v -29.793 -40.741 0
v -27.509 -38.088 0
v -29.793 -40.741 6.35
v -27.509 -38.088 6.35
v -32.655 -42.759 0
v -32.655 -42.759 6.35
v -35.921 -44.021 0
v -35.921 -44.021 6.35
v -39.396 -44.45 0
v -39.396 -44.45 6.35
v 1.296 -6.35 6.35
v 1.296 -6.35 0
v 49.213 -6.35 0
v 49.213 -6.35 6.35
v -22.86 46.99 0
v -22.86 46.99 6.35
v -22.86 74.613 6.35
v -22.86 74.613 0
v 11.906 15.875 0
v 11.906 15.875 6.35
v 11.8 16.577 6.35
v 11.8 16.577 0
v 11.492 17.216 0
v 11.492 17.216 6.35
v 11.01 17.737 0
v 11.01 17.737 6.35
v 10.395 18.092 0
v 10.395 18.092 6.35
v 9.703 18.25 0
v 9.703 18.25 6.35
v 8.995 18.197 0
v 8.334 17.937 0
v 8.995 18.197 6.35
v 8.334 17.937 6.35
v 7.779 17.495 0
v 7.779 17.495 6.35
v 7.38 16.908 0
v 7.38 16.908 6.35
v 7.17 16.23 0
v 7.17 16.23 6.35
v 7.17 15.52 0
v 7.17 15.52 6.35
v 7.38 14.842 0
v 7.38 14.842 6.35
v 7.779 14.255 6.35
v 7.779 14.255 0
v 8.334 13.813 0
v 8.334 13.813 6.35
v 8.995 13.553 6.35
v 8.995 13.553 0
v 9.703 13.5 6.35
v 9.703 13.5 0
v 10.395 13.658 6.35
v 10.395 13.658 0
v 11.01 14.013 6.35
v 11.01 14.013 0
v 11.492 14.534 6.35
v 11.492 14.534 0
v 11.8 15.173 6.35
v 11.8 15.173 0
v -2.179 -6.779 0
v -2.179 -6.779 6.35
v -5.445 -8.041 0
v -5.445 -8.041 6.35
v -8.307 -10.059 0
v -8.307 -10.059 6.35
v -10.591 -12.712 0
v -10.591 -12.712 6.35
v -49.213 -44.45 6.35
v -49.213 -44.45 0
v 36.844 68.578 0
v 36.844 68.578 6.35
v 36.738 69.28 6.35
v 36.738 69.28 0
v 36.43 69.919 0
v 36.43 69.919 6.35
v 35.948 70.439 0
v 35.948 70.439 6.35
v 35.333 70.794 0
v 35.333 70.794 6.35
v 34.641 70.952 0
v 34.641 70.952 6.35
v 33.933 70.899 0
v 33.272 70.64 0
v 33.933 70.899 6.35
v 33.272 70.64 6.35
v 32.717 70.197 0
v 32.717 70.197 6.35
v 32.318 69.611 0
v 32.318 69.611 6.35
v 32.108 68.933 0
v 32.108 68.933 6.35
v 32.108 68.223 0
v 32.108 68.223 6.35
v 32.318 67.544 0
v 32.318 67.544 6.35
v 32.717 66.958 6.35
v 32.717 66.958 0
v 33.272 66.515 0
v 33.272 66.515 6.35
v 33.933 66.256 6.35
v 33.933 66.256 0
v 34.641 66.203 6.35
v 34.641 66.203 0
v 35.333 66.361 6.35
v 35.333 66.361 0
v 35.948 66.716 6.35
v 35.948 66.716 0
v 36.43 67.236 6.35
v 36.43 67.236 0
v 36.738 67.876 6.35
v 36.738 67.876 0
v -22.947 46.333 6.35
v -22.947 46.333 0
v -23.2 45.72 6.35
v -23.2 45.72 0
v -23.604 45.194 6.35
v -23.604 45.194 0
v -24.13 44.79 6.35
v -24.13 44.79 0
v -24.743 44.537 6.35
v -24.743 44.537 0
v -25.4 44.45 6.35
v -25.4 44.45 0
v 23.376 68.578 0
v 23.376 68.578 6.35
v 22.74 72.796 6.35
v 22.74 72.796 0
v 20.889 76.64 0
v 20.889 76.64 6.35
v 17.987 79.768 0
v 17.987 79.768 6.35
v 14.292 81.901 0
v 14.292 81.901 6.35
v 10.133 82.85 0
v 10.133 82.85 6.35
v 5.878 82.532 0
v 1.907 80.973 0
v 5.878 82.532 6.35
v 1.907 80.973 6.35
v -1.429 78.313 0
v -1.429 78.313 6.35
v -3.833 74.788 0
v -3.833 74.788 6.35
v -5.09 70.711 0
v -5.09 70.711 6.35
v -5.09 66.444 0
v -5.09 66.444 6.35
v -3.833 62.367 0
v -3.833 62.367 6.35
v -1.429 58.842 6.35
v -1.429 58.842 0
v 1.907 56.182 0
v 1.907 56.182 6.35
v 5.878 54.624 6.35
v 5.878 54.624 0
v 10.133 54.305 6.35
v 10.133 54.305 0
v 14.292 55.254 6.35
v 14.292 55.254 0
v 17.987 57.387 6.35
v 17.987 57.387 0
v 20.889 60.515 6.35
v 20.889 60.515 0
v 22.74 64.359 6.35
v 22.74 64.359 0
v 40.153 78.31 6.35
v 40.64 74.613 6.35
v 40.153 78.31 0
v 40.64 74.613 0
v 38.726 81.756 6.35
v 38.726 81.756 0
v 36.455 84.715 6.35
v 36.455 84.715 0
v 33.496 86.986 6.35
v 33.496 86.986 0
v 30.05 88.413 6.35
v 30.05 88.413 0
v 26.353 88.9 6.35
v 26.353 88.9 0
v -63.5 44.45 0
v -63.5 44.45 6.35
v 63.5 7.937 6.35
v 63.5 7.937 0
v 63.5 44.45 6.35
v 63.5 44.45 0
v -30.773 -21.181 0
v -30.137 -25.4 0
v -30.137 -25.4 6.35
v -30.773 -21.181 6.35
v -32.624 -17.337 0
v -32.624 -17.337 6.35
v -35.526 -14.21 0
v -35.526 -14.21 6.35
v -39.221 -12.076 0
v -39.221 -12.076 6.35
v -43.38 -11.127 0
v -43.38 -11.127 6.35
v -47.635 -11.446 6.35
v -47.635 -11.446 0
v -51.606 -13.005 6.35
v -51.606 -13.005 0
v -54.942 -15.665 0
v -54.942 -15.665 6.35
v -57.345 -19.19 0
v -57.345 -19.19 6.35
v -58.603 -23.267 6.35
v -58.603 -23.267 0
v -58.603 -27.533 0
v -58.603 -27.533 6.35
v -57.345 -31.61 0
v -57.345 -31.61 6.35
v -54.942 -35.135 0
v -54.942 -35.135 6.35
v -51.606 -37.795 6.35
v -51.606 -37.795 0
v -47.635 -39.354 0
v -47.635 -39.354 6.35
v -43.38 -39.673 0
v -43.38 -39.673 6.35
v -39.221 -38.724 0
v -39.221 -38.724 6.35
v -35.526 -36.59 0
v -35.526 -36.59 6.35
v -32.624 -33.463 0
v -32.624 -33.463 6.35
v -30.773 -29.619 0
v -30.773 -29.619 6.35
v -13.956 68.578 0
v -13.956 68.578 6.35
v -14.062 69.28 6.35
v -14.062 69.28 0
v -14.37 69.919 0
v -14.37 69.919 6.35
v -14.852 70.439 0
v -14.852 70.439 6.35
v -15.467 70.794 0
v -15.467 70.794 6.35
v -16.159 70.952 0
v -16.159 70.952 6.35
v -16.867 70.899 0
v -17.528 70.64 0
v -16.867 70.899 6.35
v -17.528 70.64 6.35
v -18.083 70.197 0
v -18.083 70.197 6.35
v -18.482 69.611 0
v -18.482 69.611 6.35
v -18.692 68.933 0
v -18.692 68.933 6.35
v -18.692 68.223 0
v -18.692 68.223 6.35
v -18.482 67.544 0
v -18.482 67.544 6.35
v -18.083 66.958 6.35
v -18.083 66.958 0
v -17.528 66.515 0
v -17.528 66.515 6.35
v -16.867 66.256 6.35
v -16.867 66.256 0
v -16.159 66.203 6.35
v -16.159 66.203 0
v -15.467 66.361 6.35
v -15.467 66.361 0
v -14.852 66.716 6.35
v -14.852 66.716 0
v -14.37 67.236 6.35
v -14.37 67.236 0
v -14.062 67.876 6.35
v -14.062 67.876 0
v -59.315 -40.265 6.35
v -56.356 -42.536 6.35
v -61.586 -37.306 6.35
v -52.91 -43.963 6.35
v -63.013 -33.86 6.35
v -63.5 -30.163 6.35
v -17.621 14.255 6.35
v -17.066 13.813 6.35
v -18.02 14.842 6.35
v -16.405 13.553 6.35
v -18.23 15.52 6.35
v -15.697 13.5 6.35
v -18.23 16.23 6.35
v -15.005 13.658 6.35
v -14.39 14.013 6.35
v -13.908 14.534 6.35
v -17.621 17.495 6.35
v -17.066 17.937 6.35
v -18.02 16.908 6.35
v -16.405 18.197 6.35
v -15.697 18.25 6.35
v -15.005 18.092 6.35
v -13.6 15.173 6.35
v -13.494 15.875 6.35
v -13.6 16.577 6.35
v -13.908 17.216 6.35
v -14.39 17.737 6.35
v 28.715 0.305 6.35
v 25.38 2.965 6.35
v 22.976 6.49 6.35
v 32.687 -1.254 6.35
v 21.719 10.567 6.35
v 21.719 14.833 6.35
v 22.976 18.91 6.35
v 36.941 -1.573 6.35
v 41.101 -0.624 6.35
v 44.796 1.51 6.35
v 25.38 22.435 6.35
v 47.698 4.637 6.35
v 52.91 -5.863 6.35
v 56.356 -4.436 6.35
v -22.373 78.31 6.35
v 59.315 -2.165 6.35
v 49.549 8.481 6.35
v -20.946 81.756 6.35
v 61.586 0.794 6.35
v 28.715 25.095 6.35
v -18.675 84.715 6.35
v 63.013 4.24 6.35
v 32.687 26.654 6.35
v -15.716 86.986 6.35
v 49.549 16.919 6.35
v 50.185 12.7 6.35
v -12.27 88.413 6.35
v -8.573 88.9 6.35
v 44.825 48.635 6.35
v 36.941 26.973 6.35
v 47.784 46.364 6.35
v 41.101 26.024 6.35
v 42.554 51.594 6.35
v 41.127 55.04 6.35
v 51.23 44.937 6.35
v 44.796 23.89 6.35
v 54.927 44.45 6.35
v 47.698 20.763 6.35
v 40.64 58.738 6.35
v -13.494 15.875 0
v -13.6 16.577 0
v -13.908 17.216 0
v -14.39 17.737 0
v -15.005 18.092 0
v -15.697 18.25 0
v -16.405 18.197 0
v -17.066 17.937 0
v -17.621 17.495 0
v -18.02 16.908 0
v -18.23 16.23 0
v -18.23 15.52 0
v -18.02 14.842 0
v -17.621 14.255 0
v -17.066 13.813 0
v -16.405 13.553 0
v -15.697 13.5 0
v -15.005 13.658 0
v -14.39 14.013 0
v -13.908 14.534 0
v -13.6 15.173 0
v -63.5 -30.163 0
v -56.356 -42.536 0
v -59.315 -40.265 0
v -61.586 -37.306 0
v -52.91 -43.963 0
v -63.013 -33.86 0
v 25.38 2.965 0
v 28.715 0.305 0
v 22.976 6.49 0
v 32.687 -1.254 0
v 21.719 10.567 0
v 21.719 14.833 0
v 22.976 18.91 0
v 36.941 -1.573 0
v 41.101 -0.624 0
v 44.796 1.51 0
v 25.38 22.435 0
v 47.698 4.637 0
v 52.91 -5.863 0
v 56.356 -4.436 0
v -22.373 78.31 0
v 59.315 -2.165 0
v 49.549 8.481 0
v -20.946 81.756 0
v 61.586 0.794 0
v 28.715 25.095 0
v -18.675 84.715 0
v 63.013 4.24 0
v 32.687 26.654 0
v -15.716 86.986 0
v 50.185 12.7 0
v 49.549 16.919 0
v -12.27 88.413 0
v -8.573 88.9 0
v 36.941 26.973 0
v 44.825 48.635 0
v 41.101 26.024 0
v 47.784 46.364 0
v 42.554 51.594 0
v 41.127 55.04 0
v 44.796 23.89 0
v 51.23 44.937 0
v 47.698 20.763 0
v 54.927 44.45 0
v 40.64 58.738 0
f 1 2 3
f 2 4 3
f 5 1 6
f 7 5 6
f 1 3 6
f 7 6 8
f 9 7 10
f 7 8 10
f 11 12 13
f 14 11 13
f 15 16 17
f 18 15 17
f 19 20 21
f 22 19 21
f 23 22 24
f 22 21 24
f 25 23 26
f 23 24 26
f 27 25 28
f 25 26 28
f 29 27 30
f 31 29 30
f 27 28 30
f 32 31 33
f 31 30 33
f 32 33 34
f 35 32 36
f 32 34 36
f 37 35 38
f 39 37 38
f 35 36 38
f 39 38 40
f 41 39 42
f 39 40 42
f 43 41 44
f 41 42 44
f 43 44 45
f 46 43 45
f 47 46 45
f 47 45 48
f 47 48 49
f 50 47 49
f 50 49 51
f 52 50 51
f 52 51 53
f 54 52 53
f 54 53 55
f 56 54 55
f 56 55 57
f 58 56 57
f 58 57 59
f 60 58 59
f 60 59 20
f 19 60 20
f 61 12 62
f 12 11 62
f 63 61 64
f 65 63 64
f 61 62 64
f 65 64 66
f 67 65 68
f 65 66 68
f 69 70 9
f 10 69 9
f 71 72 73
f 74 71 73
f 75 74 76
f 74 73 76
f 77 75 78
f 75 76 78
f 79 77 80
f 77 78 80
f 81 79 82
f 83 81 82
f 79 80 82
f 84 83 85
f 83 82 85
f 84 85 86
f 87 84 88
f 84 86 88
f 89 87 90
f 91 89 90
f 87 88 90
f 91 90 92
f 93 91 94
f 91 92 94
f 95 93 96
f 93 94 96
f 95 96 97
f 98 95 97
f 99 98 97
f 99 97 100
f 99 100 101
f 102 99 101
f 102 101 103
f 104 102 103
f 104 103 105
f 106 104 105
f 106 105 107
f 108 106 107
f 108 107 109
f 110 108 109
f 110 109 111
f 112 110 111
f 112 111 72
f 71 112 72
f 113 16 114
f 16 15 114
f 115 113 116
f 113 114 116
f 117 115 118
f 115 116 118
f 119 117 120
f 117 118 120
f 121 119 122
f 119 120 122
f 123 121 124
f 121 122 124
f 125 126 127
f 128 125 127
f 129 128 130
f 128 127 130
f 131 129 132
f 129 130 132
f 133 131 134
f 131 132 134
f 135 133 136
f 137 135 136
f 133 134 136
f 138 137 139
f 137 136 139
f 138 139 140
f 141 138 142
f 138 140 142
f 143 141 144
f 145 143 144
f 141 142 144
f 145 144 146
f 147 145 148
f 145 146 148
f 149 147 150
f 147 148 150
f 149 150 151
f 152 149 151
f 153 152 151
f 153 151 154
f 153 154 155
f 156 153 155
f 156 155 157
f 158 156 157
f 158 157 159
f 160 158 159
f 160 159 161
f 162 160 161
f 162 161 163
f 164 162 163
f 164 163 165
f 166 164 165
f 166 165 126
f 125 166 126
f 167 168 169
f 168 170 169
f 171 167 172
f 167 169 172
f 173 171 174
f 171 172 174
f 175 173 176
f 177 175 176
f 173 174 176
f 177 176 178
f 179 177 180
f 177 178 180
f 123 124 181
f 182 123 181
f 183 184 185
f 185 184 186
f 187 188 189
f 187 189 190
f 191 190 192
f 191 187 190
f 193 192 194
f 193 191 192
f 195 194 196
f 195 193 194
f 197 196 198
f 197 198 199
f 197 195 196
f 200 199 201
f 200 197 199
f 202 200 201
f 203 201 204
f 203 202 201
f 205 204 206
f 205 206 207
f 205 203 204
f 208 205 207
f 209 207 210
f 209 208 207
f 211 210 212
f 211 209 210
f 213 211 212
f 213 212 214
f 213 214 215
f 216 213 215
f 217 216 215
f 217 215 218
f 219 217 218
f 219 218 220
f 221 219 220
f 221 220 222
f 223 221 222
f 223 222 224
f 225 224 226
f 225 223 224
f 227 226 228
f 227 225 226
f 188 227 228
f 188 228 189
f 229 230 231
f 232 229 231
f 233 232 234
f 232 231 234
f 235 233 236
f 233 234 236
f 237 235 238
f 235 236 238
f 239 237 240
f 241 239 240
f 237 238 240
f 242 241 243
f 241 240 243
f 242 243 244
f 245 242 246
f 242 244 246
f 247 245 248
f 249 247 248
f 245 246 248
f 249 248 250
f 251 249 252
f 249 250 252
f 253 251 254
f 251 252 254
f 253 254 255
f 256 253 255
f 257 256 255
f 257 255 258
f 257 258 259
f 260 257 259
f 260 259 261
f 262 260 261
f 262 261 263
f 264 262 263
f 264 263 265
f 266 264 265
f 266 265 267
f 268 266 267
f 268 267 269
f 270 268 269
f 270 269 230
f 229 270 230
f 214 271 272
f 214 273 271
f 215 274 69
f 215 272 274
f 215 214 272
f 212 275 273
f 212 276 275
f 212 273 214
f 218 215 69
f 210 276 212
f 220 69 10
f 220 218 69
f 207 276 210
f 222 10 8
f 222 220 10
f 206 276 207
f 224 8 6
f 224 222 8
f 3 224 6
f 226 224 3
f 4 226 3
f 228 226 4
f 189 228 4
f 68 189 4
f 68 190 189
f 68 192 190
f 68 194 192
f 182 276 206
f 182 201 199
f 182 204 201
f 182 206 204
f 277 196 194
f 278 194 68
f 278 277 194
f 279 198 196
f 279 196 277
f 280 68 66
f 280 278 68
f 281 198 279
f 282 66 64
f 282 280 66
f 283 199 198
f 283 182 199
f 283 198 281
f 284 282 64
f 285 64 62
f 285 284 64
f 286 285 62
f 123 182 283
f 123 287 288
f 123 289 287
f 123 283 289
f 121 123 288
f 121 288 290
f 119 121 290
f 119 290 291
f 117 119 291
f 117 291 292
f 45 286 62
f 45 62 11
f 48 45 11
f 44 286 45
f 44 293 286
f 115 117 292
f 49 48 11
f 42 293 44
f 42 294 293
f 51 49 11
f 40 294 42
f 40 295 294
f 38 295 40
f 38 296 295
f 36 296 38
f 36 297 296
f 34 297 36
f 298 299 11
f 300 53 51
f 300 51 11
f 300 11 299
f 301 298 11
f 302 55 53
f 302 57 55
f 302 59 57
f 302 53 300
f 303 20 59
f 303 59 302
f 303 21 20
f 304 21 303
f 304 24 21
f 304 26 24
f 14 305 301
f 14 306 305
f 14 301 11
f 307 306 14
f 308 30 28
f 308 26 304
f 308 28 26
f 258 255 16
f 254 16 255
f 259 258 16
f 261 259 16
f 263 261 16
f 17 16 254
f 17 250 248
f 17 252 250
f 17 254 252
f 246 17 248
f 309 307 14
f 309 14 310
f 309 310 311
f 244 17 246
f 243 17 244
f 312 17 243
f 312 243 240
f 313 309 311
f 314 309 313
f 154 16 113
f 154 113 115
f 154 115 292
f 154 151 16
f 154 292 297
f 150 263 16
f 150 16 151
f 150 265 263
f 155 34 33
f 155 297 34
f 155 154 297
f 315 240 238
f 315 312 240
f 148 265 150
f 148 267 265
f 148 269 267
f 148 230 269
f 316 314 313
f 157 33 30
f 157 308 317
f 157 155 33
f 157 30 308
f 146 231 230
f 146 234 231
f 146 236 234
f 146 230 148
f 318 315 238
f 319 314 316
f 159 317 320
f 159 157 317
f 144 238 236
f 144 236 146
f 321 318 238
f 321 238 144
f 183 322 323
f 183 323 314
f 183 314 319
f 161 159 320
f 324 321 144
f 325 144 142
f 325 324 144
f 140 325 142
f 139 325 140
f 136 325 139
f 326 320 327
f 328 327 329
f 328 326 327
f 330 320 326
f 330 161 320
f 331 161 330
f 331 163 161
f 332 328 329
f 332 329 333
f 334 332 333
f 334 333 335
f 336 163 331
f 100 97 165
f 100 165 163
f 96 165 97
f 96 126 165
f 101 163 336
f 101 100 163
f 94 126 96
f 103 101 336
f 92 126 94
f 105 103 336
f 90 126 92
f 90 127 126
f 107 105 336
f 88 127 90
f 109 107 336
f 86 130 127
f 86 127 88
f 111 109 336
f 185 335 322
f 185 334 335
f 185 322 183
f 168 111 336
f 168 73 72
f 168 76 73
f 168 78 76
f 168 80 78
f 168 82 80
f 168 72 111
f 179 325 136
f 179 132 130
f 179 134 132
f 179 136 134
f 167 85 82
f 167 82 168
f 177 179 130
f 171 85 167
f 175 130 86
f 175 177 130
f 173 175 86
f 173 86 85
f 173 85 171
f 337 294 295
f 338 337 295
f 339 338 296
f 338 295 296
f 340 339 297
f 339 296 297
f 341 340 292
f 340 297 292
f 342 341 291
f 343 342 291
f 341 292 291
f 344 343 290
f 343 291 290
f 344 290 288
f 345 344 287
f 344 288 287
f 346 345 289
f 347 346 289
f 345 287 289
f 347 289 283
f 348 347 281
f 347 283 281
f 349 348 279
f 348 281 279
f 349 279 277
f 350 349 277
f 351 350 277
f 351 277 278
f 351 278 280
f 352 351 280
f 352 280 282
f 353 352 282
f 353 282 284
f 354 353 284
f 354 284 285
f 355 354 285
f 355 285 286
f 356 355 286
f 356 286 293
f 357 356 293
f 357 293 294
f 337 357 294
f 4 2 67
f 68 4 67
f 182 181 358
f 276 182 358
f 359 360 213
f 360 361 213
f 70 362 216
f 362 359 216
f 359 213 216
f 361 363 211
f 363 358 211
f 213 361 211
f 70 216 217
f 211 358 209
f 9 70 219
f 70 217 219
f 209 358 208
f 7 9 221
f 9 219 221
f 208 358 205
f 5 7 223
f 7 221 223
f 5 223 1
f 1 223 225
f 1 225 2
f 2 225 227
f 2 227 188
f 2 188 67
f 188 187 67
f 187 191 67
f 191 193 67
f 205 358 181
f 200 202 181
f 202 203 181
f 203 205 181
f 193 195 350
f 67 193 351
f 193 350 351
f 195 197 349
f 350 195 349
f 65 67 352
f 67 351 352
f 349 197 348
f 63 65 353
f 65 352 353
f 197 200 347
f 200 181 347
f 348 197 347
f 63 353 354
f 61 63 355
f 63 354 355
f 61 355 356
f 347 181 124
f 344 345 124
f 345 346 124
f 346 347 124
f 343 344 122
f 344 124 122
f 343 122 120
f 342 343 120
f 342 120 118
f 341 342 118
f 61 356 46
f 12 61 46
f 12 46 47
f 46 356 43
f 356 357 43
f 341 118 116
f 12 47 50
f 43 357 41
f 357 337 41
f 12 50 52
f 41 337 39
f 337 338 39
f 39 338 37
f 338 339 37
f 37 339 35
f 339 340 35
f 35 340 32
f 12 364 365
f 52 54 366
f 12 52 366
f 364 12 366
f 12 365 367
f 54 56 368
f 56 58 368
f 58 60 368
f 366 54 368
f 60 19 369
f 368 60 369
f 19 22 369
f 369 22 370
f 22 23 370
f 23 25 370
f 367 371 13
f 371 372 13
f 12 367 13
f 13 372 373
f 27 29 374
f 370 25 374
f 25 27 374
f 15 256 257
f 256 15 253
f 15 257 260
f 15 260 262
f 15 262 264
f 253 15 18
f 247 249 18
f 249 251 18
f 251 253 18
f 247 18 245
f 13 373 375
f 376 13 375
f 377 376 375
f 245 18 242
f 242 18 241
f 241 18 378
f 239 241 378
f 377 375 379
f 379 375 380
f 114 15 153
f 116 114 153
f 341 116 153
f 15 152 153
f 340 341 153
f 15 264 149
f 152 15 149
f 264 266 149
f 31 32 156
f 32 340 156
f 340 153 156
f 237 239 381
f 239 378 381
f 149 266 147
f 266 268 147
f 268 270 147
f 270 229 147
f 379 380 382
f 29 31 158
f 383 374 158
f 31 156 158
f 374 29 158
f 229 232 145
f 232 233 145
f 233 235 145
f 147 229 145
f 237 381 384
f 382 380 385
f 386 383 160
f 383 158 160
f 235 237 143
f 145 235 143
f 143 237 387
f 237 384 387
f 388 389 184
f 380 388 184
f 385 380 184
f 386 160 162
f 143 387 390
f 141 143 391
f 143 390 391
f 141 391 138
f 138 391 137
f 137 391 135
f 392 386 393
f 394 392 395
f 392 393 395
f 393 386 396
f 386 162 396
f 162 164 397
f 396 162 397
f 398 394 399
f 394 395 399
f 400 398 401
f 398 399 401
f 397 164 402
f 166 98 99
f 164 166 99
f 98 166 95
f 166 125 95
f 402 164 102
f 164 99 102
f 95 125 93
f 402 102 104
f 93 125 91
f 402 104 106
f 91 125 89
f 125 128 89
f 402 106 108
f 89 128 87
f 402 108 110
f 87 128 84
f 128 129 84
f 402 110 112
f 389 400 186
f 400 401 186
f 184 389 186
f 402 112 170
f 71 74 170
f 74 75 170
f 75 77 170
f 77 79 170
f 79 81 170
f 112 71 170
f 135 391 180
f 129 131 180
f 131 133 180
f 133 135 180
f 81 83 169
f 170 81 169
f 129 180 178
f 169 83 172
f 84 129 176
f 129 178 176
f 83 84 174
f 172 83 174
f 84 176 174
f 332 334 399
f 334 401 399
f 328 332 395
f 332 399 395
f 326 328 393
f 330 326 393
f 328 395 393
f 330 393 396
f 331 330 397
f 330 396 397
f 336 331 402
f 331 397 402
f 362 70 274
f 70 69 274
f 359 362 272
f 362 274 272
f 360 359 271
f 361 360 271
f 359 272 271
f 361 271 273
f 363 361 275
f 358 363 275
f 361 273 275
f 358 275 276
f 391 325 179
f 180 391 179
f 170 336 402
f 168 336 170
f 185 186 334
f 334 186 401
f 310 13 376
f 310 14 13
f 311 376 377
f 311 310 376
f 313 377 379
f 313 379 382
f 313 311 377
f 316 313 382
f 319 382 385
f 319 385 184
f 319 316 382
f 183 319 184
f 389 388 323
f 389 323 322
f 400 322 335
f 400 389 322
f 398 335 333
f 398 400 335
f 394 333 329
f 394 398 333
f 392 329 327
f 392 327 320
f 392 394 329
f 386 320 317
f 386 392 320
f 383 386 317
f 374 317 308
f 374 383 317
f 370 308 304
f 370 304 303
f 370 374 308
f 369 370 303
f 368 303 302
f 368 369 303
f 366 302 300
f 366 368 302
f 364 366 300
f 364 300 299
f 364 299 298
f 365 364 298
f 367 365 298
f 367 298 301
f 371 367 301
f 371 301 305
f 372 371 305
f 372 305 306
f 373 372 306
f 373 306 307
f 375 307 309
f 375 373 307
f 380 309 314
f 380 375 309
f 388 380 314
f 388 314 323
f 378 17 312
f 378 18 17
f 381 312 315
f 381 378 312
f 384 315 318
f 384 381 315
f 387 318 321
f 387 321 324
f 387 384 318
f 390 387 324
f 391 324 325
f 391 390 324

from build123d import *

# Parameters (mm, degrees)
SKETCH1_R           = 14.3129
BOSS_EXTRUDE1_DEPTH = 6.35
FILLET1_R           = 14.2875
SKETCH2_W           = 63.5
SKETCH2_H           = 44.45
BOSS_EXTRUDE2_DEPTH = 6.35
FILLET2_R           = 14.2875
SKETCH3_R           = 14.3129
CUT_EXTRUDE1_DEPTH  = 110.433918417
SKETCH4_R           = 2.38125
SKETCH4_R_2         = 14.2875
CUT_EXTRUDE2_DEPTH  = 110.433918417
SKETCH5_R           = 2.38125
CUT_EXTRUDE3_DEPTH  = 110.433918417
FILLET3_R           = 2.54


with BuildPart() as part:
    # Sketch1 → Boss-Extrude1 (new body)
    with BuildSketch(Plane.XY):
        Polygon((-6.35, -6.35), (63.5, -6.35), (63.5, 44.45), (-63.5, 44.45), (-63.5, -44.45), (-31.75, -44.45), align=None)
        with Locations((-44.45, -25.4)):
            Circle(SKETCH1_R, mode=Mode.SUBTRACT)
        with Locations((35.871852568, 12.7)):
            Circle(SKETCH1_R, mode=Mode.SUBTRACT)
    extrude(amount=BOSS_EXTRUDE1_DEPTH)

    # Fillet1
    fillet1_edges = [part.edges().sort_by_distance(p)[0] for p in [
        (-31.75, -44.45, 3.175),
        (-63.5, -44.45, 3.175),
        (63.5, -6.35, 3.175),
        (-6.35, -6.35, 3.175),
    ]]
    fillet(fillet1_edges, radius=FILLET1_R)

    # Sketch2 → Boss-Extrude2 (add)
    with BuildSketch(Plane.XY.offset(6.35)):
        with Locations((8.89, 66.675)):
            Rectangle(SKETCH2_W, SKETCH2_H)
    extrude(amount=-BOSS_EXTRUDE2_DEPTH)

    # Fillet2
    fillet2_edges = [part.edges().sort_by_distance(p)[0] for p in [
        (-22.86, 88.9, 3.175),
        (40.64, 88.9, 3.175),
        (40.64, 44.45, 3.175),
    ]]
    fillet(fillet2_edges, radius=FILLET2_R)

    # Sketch3 → Cut-Extrude1 (cut, through all)
    with BuildSketch(Plane.XY.offset(6.35)):
        with Locations((9.062967637, 68.577618639)):
            Circle(SKETCH3_R)
    extrude(amount=-CUT_EXTRUDE1_DEPTH, mode=Mode.SUBTRACT)

    # Sketch4 → Cut-Extrude2 (cut, through all)
    with BuildSketch(Plane.XY.offset(6.35)):
        with Locations((-16.337032363, 68.577618639)):
            Circle(SKETCH4_R)
        with Locations((34.462967637, 68.577618639)):
            Circle(SKETCH4_R)
        with Locations((9.062967637, 68.577618639)):
            Circle(SKETCH4_R_2)
    extrude(amount=-CUT_EXTRUDE2_DEPTH, mode=Mode.SUBTRACT)

    # Sketch5 → Cut-Extrude3 (cut, through all)
    with BuildSketch(Plane.XY.offset(6.35)):
        with Locations((-15.875, 15.875)):
            Circle(SKETCH5_R)
        with Locations((9.525, 15.875)):
            Circle(SKETCH5_R)
    extrude(amount=-CUT_EXTRUDE3_DEPTH, mode=Mode.SUBTRACT)

    # Fillet3
    fillet3_edges = [part.edges().sort_by_distance(p)[0] for p in [
        (-22.86, 44.45, 3.175),
    ]]
    fillet(fillet3_edges, radius=FILLET3_R)


solid = part.part
